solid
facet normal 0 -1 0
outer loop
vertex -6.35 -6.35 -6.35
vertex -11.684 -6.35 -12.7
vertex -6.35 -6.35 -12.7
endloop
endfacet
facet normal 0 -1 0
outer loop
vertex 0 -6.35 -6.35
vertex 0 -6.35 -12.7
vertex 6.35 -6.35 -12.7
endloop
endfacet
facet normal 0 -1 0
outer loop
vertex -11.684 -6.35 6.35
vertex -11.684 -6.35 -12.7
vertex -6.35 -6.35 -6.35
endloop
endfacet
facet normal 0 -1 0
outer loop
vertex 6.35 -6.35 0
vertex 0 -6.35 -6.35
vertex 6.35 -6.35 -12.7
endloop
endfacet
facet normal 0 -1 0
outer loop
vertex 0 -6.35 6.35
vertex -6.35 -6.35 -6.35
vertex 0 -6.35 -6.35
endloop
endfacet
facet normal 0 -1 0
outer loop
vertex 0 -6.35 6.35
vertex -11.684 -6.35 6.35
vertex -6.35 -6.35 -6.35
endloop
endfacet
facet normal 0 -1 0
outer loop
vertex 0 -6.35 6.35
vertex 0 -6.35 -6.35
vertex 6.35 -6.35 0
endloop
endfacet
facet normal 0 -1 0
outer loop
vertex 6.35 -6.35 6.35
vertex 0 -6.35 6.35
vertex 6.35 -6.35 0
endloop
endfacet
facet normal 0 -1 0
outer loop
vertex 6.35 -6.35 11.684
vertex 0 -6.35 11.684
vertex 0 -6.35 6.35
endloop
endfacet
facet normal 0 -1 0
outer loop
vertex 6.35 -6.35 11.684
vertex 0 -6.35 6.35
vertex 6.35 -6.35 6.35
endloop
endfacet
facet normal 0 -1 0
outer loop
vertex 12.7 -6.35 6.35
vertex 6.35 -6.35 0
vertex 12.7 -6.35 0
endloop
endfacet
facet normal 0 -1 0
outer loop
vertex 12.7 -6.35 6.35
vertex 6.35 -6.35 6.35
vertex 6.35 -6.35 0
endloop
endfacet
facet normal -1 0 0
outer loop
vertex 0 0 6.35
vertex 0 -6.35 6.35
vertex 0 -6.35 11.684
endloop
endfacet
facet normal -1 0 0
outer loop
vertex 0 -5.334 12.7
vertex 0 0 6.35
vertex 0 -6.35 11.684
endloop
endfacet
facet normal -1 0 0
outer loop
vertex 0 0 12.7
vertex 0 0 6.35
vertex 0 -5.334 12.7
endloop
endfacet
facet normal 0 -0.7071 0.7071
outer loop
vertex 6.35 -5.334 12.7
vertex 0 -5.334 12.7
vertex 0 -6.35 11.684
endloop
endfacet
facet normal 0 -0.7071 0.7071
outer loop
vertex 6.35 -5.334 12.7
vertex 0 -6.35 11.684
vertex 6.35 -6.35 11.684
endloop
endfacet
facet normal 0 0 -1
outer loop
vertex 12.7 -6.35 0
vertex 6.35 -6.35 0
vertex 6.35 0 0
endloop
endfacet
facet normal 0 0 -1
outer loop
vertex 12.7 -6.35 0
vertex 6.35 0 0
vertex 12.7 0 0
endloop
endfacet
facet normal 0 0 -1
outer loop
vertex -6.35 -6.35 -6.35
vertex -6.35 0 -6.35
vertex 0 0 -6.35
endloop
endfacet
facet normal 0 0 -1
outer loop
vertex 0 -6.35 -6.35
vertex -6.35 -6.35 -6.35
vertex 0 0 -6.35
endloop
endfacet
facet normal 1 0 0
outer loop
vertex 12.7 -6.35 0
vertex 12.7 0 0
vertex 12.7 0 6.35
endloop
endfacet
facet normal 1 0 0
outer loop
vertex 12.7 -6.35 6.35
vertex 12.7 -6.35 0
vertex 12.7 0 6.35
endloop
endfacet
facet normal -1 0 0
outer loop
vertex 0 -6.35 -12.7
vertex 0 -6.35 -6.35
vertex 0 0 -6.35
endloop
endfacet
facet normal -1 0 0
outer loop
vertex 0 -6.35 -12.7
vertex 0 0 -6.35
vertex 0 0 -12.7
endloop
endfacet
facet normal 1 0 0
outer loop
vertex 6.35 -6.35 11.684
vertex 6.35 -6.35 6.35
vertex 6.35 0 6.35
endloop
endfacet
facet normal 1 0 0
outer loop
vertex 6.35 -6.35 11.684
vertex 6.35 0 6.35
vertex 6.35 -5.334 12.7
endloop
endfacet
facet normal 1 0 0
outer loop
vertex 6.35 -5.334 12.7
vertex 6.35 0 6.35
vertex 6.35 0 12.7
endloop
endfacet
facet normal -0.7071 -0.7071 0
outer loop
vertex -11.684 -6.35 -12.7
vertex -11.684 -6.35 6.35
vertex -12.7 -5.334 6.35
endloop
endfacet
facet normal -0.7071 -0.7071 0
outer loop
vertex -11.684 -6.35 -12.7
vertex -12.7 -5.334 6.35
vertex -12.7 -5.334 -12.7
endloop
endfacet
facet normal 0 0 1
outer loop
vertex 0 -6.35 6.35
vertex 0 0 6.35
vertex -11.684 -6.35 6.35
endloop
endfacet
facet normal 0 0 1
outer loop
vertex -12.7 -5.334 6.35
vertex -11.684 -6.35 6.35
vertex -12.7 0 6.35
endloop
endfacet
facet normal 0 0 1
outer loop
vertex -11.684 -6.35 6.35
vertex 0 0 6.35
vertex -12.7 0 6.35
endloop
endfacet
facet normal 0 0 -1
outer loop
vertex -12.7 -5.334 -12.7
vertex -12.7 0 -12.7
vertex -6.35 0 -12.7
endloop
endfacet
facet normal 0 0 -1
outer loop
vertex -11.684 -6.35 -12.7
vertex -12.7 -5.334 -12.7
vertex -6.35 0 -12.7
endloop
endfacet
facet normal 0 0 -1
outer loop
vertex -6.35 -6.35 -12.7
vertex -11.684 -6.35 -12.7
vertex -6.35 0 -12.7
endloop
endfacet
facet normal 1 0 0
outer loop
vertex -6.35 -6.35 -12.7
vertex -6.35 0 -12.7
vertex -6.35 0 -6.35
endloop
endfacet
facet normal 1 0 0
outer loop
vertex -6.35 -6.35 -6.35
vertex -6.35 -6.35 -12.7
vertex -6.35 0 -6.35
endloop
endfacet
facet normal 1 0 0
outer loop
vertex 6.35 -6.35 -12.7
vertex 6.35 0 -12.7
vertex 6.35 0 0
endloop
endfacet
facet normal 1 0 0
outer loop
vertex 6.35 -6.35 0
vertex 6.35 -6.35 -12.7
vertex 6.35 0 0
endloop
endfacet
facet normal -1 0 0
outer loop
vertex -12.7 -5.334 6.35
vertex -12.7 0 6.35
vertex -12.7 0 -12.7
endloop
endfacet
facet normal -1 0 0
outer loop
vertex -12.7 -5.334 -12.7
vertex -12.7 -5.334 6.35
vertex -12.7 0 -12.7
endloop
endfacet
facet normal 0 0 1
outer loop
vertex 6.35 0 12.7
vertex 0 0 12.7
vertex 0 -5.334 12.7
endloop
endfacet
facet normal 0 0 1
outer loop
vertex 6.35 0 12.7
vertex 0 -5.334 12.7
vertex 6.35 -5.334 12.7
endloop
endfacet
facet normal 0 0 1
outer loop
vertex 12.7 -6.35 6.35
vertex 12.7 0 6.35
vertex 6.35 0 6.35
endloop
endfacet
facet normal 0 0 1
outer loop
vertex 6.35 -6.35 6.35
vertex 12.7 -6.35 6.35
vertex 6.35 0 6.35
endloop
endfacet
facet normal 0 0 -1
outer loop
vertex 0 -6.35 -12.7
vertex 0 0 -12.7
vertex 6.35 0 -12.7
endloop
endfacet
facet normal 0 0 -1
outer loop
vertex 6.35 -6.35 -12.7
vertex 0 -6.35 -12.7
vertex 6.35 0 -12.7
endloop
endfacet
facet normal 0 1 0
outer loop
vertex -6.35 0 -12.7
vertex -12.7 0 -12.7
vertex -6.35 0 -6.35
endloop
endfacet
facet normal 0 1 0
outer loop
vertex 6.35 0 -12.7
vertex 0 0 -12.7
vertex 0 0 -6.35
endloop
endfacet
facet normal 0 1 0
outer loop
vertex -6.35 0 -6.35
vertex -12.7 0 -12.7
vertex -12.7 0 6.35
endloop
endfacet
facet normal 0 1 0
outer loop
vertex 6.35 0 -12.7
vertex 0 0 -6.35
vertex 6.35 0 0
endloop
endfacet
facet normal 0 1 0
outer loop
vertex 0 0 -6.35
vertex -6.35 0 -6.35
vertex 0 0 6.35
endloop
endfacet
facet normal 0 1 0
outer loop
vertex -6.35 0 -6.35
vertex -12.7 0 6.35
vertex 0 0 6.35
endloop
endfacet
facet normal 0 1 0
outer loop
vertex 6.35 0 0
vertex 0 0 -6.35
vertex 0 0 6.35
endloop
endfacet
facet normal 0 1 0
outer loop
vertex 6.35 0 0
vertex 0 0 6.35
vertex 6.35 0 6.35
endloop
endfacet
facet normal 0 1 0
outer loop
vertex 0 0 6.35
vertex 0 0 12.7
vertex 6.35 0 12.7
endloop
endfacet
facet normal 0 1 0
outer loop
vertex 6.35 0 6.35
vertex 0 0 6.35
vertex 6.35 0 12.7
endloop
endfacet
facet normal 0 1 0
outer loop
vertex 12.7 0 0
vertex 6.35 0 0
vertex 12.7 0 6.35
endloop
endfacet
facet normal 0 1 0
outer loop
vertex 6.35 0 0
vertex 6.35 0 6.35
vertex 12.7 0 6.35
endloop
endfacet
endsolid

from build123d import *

# Parameters (mm, degrees)
F0_W     = 6.35
F0_H     = 6.35
F1_DEPTH = 6.35
F2_SIZE  = 1.016
F3_SIZE  = 1.016


with BuildPart() as f1:
    # F0 (on Front) → F1 (new body)
    with BuildSketch(Plane.XZ):
        Polygon((0, -12.7), (6.35, -12.7), (6.35, 0), (12.7, 0), (12.7, 6.35), (6.35, 6.35), (0, 6.35), (-12.7, 6.35), (-12.7, -12.7), (-6.35, -12.7), (-6.35, -6.35), (0, -6.35), align=None)
        with Locations((3.175, 9.525)):
            Rectangle(F0_W, F0_H)
    extrude(amount=F1_DEPTH)

    # F2
    f2_edges = [f1.edges().sort_by_distance(p)[0] for p in [
        (-12.7, -6.35, -3.175),
    ]]
    chamfer(f2_edges, length=F2_SIZE)

    # F3
    f3_edges = [f1.edges().sort_by_distance(p)[0] for p in [
        (3.175, -6.35, 12.7),
    ]]
    chamfer(f3_edges, length=F3_SIZE)


solid = f1.part
